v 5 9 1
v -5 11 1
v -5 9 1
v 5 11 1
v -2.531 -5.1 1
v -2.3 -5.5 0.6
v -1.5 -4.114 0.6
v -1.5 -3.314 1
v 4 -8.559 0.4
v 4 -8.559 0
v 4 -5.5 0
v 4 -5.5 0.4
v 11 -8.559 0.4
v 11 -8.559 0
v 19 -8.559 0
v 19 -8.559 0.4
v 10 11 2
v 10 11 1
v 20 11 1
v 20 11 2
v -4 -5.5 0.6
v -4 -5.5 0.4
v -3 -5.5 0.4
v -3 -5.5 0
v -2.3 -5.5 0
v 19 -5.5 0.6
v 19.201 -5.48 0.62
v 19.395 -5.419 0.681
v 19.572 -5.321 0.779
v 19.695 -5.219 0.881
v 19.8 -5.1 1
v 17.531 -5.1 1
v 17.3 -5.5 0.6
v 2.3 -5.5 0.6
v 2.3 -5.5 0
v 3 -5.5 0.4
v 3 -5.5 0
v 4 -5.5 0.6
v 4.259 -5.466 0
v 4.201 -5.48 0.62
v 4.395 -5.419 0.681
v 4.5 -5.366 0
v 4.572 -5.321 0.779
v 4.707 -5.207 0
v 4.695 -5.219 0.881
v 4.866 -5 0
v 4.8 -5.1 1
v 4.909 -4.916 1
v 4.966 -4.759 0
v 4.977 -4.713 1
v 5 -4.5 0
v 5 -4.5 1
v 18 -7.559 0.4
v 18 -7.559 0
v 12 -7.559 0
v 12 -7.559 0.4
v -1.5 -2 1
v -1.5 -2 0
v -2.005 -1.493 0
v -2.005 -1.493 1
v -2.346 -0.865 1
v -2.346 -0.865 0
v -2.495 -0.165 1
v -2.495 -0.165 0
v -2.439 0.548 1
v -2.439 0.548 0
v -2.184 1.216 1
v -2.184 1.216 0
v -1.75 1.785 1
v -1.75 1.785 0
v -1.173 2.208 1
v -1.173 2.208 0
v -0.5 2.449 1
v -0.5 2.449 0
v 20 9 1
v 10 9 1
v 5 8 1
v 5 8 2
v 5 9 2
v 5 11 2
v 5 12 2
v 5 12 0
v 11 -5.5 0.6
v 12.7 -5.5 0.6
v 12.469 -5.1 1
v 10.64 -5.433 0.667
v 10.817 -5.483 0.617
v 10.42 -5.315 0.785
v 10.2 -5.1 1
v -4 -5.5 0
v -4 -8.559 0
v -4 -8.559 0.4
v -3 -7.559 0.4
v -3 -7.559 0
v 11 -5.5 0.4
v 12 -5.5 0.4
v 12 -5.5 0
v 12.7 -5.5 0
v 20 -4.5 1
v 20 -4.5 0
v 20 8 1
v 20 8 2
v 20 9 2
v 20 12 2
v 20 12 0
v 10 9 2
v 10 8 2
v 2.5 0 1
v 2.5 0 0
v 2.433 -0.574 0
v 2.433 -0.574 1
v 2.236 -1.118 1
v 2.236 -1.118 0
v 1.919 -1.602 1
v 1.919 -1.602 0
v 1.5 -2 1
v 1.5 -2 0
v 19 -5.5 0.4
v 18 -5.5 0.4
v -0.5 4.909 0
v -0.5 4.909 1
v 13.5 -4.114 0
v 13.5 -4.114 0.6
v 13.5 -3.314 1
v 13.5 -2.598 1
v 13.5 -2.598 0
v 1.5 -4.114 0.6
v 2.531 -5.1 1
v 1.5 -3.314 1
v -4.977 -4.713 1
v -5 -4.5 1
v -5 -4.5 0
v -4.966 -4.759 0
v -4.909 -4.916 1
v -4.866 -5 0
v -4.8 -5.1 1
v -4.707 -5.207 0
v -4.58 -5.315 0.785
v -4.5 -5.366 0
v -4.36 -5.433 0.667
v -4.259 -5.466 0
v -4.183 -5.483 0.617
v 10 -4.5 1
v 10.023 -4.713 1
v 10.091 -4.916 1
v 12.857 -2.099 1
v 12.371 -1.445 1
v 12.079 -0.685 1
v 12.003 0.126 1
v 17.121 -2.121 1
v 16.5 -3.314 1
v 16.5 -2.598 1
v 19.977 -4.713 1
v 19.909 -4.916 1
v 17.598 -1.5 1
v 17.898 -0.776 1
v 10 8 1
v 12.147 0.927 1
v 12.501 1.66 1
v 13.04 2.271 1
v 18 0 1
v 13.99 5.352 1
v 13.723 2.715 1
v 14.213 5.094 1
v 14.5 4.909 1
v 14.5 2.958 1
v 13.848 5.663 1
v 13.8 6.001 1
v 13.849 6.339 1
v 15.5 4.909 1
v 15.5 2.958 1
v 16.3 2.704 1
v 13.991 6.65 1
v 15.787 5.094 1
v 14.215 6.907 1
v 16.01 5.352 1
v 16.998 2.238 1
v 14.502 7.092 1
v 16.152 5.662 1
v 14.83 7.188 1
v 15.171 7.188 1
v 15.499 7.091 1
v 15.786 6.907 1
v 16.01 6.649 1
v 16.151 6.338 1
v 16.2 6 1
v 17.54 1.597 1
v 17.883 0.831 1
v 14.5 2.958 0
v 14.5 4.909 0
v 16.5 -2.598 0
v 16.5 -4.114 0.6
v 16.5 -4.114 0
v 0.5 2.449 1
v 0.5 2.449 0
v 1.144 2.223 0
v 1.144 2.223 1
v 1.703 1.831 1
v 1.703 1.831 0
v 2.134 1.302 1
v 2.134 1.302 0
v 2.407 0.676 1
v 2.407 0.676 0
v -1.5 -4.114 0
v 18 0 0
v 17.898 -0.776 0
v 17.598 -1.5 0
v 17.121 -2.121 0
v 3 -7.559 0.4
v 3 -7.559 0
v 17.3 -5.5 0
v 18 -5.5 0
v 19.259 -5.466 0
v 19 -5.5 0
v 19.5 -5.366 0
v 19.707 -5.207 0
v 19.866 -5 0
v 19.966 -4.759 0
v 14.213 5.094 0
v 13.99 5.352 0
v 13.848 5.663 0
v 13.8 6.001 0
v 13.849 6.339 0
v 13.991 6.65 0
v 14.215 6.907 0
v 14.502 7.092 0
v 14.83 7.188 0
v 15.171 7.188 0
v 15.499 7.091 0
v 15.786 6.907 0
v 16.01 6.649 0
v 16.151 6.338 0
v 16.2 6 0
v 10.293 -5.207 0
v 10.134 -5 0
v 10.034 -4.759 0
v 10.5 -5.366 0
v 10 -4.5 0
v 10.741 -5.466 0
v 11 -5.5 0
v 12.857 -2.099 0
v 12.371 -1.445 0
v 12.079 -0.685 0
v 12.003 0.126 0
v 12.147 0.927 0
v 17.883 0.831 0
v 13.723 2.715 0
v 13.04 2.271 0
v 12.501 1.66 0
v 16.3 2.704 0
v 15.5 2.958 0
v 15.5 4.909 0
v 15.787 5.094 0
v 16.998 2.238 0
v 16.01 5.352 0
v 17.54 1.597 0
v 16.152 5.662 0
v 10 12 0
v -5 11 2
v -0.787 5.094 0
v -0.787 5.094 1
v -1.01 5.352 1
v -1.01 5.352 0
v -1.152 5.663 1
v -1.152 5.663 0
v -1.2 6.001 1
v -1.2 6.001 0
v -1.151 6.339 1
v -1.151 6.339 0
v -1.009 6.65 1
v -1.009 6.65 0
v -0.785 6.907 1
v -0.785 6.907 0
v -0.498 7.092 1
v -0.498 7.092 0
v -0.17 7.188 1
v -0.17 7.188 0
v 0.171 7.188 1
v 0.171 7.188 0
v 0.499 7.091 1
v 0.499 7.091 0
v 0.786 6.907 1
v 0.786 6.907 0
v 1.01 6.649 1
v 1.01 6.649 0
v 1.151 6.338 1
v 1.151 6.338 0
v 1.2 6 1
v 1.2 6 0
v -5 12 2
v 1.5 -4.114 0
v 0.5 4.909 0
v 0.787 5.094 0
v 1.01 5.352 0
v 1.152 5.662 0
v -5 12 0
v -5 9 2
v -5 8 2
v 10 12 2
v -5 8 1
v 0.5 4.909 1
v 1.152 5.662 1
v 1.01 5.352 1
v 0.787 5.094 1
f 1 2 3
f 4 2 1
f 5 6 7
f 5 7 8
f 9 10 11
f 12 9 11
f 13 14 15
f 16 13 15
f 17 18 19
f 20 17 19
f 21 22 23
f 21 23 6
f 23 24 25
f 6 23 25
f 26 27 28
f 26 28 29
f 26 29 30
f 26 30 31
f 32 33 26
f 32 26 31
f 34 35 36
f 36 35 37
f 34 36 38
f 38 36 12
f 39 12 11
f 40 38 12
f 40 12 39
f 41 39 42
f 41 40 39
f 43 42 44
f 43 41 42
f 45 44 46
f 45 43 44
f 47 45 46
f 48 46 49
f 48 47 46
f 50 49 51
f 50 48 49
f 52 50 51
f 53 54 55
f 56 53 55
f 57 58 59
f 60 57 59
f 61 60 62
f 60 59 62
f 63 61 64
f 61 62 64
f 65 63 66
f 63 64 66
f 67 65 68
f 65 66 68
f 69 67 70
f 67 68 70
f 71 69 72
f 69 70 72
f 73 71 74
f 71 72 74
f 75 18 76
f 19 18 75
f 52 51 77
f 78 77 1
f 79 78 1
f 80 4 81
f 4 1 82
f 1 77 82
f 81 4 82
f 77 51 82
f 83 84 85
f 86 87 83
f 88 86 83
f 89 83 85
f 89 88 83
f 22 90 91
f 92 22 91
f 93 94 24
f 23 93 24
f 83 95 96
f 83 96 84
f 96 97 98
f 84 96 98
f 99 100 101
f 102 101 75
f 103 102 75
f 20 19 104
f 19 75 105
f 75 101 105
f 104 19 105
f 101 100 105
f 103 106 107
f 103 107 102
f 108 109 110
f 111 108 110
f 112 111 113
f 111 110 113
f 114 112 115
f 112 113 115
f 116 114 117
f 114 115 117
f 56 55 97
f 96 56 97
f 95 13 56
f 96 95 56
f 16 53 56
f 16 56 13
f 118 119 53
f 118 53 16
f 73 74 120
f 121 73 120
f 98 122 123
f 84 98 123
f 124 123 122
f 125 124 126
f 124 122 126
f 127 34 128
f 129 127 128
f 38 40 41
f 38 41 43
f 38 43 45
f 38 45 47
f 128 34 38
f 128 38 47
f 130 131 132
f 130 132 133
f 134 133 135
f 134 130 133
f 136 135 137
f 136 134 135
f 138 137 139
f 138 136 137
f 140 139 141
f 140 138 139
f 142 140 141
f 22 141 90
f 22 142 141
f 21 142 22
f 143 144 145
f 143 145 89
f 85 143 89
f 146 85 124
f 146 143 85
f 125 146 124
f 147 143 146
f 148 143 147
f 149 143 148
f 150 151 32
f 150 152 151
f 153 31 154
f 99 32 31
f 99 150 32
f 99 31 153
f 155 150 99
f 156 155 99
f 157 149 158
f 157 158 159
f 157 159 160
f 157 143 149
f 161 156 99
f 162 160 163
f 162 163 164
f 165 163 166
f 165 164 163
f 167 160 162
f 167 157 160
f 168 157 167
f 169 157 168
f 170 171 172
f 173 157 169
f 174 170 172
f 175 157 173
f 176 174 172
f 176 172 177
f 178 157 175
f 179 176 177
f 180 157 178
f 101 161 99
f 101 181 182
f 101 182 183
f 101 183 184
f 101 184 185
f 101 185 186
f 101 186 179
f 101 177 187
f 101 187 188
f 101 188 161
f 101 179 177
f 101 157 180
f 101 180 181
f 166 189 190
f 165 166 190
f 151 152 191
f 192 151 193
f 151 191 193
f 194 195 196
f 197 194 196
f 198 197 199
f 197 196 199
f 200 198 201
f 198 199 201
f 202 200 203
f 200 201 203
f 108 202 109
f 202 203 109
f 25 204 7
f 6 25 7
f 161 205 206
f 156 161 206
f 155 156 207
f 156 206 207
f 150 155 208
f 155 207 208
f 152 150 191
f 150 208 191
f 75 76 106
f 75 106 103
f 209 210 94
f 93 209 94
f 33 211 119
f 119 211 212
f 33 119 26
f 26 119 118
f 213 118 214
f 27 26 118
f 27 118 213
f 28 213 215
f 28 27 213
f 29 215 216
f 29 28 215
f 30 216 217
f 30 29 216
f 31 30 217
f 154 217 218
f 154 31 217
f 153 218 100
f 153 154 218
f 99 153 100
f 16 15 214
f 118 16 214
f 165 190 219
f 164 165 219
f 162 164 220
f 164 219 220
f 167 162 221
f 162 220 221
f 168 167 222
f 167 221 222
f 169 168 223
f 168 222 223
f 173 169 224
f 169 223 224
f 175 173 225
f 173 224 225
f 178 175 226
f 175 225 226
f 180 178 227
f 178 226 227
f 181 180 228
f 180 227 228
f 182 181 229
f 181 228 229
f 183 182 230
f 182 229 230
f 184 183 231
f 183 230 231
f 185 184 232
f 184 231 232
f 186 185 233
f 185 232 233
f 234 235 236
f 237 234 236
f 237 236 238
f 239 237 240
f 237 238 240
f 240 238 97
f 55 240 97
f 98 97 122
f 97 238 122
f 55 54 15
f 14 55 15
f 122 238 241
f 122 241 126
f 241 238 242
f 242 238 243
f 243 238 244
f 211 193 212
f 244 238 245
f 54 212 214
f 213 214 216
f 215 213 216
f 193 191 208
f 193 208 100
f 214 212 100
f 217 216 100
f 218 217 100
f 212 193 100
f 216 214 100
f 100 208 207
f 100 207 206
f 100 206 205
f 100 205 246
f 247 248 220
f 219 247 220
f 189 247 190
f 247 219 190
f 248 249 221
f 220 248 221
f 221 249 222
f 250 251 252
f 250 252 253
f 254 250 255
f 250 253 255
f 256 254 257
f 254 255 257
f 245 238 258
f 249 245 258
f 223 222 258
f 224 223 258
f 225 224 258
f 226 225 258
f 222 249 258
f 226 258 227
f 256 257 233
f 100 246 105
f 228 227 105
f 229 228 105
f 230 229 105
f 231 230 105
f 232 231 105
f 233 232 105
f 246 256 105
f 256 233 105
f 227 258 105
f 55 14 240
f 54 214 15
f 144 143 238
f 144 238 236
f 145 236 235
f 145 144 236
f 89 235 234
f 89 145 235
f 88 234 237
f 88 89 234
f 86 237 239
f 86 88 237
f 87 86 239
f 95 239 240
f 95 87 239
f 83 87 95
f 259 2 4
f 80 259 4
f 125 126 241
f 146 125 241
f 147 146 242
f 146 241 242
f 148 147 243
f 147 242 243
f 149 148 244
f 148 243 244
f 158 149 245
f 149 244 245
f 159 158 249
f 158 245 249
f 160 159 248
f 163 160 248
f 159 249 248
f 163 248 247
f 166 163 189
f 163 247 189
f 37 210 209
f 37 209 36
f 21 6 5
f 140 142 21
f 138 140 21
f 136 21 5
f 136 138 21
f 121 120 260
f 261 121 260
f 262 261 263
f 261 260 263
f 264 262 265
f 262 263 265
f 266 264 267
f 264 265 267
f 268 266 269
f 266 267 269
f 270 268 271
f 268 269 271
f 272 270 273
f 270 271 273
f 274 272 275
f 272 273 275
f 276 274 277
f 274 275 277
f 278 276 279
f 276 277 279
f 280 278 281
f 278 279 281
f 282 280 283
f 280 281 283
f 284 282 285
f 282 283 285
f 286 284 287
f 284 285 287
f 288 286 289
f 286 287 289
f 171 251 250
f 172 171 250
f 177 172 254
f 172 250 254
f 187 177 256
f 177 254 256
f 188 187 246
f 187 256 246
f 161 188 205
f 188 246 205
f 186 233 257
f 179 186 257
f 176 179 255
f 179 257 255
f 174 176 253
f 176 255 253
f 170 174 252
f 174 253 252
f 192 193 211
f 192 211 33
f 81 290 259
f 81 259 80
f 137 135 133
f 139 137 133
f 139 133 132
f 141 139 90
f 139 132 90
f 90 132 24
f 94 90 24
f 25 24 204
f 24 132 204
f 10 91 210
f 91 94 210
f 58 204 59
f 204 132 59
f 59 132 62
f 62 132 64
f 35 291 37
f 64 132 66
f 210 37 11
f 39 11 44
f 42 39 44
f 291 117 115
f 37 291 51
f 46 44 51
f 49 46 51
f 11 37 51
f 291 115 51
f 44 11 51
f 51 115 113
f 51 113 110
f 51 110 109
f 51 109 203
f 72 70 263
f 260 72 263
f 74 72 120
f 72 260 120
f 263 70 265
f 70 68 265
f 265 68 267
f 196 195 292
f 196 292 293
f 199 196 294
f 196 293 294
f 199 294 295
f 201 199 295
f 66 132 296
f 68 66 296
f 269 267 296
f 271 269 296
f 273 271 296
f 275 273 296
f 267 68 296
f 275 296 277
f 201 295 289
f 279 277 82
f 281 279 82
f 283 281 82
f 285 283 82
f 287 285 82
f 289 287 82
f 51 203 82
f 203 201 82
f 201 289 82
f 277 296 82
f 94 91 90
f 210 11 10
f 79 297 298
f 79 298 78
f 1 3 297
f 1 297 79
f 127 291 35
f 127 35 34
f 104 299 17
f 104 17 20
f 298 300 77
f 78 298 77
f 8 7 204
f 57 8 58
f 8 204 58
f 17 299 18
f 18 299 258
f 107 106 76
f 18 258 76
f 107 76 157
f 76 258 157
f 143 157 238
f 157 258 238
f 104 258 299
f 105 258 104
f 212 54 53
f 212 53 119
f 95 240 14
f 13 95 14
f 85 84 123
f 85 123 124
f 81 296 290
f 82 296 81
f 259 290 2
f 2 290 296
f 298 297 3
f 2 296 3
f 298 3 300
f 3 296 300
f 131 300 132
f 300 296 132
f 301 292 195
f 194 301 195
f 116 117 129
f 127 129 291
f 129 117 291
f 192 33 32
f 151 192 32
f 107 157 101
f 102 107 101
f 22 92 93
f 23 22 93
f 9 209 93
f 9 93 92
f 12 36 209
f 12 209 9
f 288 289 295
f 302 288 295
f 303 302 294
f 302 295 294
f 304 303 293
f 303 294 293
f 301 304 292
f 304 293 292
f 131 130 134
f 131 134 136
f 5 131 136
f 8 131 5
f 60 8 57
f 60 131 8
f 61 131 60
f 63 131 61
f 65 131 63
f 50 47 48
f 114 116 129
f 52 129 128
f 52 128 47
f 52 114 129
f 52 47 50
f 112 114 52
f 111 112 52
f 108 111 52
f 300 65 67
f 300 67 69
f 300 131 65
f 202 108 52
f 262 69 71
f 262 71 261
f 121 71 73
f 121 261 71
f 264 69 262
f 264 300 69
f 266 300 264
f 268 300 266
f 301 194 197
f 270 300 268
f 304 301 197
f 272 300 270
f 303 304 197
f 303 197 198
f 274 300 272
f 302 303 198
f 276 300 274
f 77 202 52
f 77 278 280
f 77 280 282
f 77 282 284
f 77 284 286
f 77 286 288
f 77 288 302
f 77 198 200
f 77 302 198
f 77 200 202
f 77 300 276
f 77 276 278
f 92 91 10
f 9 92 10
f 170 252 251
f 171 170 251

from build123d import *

# Parameters (mm, degrees)
F0_W        = 10
F0_H        = 1
F0_H_2      = 2
F1_DEPTH    = 1
F2_DEPTH    = 2
F3_R        = 1
F4_SIZE2    = 1.3856406461
F4_SIZE     = 0.8
F5_SIZE2    = 1.3856406461
F5_SIZE     = 0.8
F6_T1_DEPTH = 3.7573463904
F6_T3_DEPTH = 3.7573463904
F6_T5_DEPTH = 3.6573463904
F6_T7_DEPTH = 3.6573463904
F0_W_2      = 1
F0_H_3      = 2.0591422394
F7_DEPTH    = 0.4
F10_DEPTH   = 2


# Not quite as in the source:
# - a fillet or chamfer that OpenCascade refuses, or shapes differently, is made with other operations: its cross-section is extruded or revolved along the edge and cut away or added


with BuildPart() as f1:
    # F0 (on Top) → F1 (new body)
    with BuildSketch(Plane.XY):
        with Locations((0, 11.5)):
            Rectangle(F0_W, F0_H)
        with Locations((0, 10)):
            Rectangle(F0_W, F0_H_2)
        with Locations((0, 8.5)):
            Rectangle(F0_W, F0_H)
        with BuildLine():
            ThreePointArc((0.5, 2.4494897428), (1.9364916731, 1.5811388301), (2.5, 0))
            ThreePointArc((2.5, 0), (2.2360679775, -1.1180339887), (1.5, -2))
            Line((1.5, -2), (1.5, -5.5))
            Line((1.5, -5.5), (3, -5.5))
            Line((3, -5.5), (4, -5.5))
            Line((4, -5.5), (5, -5.5))
            Line((5, -5.5), (5, 8))
            Line((5, 8), (-5, 8))
            Line((-5, 8), (-5, -5.5))
            Line((-5, -5.5), (-4, -5.5))
            Line((-4, -5.5), (-3, -5.5))
            Line((-3, -5.5), (-1.5, -5.5))
            Line((-1.5, -5.5), (-1.5, -2))
            ThreePointArc((-1.5, -2), (-2.4391575888, 0.5481881586), (-0.5, 2.4494897428))
            Line((-0.5, 2.4494897428), (-0.5, 4.9091287885))
            ThreePointArc((-0.5, 4.9091287885), (-0.6480740698, 7.0099504938), (1.2, 6))
            ThreePointArc((1.2, 6), (1.0099504938, 5.3519259302), (0.5, 4.9091287885))
            Line((0.5, 4.9091287885), (0.5, 2.4494897428))
        make_face()
    extrude(amount=F1_DEPTH)

    # F0 (on Top) → F2 (join)
    with BuildSketch(Plane.XY):
        with Locations((0, 11.5)):
            Rectangle(F0_W, F0_H)
        with Locations((0, 8.5)):
            Rectangle(F0_W, F0_H)
    extrude(amount=F2_DEPTH)

    # F3
    f3_edges = [f1.edges().sort_by_distance(p)[0] for p in [
        (-5, -5.5, 0.5),
        (5, -5.5, 0.5),
    ]]
    fillet(f3_edges, radius=F3_R)

    # F4
    f4_edges = [f1.edges().sort_by_distance(p)[0] for p in [
        (-1.5, -5.5, 0.5),
    ]]
    f4_side = f1.faces().sort_by_distance((-2.75, -5.5, 0.5))[0]
    chamfer(f4_edges, length=F4_SIZE, length2=F4_SIZE2, reference=f4_side)

    # F5
    f5_edges = [f1.edges().sort_by_distance(p)[0] for p in [
        (1.5, -5.5, 0.5),
    ]]
    f5_side = f1.faces().sort_by_distance((2.75, -5.5, 0.5))[0]
    chamfer(f5_edges, length=F5_SIZE, length2=F5_SIZE2, reference=f5_side)

    # F6: chamfer of 0.4 on 4 edges, made by hand

    # F6_s2 → F6_t1 (cut)
    with BuildSketch(Plane.YZ.offset(-5.0286731952)):
        Polygon((-5.5, 0.6), (-5.1, 1), (-5.5, 1), align=None)
    extrude(amount=F6_T1_DEPTH, mode=Mode.SUBTRACT)

    # F6_s4 → F6_t3 (cut)
    with BuildSketch(Plane.YZ.offset(1.2713268048)):
        Polygon((-5.5, 0.6), (-5.1, 1), (-5.5, 1), align=None)
    extrude(amount=F6_T3_DEPTH, mode=Mode.SUBTRACT)

    # F6_s6 → F6_t5 (cut)
    with BuildSketch(Plane(origin=(-3.470906458, -6.0117863336, 0), x_dir=(0, 0, 1), z_dir=(0.5, 0.8660254038, 0))):
        Polygon((0.6, 0.7581415713), (1, 0.3581415713), (1, 0.7581415713), align=None)
    extrude(amount=F6_T5_DEPTH, mode=Mode.SUBTRACT)

    # F6_s8 → F6_t7 (cut)
    with BuildSketch(Plane(origin=(3.470906458, -6.0117863336, 0), x_dir=(0, 0, 1), z_dir=(-0.5, 0.8660254038, 0))):
        Polygon((0.6, -0.7581415713), (1, -0.3581415713), (1, -0.7581415713), align=None)
    extrude(amount=F6_T7_DEPTH, mode=Mode.SUBTRACT)

    # F0 (on Top) → F7 (join)
    with BuildSketch(Plane.XY):
        with Locations((-3.5, -6.5295711197)):
            Rectangle(F0_W_2, F0_H_3)
        Polygon((4, -7.5591422394), (3, -7.5591422394), (-3, -7.5591422394), (-4, -7.5591422394), (-4, -8.5591422394), (4, -8.5591422394), align=None)
        with Locations((3.5, -6.5295711197)):
            Rectangle(F0_W_2, F0_H_3)
    extrude(amount=F7_DEPTH)


with BuildPart() as f8_1:
    # F8: copy of F1
    add(f1.part.moved(Location((15, 0, 0))))

    # F9 (on face) → F10 (cut)
    with BuildSketch(Plane(origin=(0, 0, 0), x_dir=(1, 0, 0), z_dir=(0, 0, -1))):
        with BuildLine():
            ThreePointArc((15.5, -2.9580398915), (17.2912878475, -1.9364916731), (18, 0))
            ThreePointArc((18, 0), (17.5980762114, 1.5), (16.5, 2.5980762114))
            Line((16.5, 2.5980762114), (16.5, 2))
            ThreePointArc((16.5, 2), (17.4391575888, -0.5481881586), (15.5, -2.4494897428))
            Line((15.5, -2.4494897428), (15.5, -2.9580398915))
        make_face()
        with BuildLine():
            Line((13.5, 2), (13.5, 2.5980762114))
            ThreePointArc((13.5, 2.5980762114), (12.0474406801, -0.5314070594), (14.5, -2.9580398915))
            Line((14.5, -2.9580398915), (14.5, -2.4494897428))
            ThreePointArc((14.5, -2.4494897428), (12.5608424112, -0.5481881586), (13.5, 2))
        make_face()
    extrude(amount=-F10_DEPTH, mode=Mode.SUBTRACT)


solid = Compound([f1.part, f8_1.part])
